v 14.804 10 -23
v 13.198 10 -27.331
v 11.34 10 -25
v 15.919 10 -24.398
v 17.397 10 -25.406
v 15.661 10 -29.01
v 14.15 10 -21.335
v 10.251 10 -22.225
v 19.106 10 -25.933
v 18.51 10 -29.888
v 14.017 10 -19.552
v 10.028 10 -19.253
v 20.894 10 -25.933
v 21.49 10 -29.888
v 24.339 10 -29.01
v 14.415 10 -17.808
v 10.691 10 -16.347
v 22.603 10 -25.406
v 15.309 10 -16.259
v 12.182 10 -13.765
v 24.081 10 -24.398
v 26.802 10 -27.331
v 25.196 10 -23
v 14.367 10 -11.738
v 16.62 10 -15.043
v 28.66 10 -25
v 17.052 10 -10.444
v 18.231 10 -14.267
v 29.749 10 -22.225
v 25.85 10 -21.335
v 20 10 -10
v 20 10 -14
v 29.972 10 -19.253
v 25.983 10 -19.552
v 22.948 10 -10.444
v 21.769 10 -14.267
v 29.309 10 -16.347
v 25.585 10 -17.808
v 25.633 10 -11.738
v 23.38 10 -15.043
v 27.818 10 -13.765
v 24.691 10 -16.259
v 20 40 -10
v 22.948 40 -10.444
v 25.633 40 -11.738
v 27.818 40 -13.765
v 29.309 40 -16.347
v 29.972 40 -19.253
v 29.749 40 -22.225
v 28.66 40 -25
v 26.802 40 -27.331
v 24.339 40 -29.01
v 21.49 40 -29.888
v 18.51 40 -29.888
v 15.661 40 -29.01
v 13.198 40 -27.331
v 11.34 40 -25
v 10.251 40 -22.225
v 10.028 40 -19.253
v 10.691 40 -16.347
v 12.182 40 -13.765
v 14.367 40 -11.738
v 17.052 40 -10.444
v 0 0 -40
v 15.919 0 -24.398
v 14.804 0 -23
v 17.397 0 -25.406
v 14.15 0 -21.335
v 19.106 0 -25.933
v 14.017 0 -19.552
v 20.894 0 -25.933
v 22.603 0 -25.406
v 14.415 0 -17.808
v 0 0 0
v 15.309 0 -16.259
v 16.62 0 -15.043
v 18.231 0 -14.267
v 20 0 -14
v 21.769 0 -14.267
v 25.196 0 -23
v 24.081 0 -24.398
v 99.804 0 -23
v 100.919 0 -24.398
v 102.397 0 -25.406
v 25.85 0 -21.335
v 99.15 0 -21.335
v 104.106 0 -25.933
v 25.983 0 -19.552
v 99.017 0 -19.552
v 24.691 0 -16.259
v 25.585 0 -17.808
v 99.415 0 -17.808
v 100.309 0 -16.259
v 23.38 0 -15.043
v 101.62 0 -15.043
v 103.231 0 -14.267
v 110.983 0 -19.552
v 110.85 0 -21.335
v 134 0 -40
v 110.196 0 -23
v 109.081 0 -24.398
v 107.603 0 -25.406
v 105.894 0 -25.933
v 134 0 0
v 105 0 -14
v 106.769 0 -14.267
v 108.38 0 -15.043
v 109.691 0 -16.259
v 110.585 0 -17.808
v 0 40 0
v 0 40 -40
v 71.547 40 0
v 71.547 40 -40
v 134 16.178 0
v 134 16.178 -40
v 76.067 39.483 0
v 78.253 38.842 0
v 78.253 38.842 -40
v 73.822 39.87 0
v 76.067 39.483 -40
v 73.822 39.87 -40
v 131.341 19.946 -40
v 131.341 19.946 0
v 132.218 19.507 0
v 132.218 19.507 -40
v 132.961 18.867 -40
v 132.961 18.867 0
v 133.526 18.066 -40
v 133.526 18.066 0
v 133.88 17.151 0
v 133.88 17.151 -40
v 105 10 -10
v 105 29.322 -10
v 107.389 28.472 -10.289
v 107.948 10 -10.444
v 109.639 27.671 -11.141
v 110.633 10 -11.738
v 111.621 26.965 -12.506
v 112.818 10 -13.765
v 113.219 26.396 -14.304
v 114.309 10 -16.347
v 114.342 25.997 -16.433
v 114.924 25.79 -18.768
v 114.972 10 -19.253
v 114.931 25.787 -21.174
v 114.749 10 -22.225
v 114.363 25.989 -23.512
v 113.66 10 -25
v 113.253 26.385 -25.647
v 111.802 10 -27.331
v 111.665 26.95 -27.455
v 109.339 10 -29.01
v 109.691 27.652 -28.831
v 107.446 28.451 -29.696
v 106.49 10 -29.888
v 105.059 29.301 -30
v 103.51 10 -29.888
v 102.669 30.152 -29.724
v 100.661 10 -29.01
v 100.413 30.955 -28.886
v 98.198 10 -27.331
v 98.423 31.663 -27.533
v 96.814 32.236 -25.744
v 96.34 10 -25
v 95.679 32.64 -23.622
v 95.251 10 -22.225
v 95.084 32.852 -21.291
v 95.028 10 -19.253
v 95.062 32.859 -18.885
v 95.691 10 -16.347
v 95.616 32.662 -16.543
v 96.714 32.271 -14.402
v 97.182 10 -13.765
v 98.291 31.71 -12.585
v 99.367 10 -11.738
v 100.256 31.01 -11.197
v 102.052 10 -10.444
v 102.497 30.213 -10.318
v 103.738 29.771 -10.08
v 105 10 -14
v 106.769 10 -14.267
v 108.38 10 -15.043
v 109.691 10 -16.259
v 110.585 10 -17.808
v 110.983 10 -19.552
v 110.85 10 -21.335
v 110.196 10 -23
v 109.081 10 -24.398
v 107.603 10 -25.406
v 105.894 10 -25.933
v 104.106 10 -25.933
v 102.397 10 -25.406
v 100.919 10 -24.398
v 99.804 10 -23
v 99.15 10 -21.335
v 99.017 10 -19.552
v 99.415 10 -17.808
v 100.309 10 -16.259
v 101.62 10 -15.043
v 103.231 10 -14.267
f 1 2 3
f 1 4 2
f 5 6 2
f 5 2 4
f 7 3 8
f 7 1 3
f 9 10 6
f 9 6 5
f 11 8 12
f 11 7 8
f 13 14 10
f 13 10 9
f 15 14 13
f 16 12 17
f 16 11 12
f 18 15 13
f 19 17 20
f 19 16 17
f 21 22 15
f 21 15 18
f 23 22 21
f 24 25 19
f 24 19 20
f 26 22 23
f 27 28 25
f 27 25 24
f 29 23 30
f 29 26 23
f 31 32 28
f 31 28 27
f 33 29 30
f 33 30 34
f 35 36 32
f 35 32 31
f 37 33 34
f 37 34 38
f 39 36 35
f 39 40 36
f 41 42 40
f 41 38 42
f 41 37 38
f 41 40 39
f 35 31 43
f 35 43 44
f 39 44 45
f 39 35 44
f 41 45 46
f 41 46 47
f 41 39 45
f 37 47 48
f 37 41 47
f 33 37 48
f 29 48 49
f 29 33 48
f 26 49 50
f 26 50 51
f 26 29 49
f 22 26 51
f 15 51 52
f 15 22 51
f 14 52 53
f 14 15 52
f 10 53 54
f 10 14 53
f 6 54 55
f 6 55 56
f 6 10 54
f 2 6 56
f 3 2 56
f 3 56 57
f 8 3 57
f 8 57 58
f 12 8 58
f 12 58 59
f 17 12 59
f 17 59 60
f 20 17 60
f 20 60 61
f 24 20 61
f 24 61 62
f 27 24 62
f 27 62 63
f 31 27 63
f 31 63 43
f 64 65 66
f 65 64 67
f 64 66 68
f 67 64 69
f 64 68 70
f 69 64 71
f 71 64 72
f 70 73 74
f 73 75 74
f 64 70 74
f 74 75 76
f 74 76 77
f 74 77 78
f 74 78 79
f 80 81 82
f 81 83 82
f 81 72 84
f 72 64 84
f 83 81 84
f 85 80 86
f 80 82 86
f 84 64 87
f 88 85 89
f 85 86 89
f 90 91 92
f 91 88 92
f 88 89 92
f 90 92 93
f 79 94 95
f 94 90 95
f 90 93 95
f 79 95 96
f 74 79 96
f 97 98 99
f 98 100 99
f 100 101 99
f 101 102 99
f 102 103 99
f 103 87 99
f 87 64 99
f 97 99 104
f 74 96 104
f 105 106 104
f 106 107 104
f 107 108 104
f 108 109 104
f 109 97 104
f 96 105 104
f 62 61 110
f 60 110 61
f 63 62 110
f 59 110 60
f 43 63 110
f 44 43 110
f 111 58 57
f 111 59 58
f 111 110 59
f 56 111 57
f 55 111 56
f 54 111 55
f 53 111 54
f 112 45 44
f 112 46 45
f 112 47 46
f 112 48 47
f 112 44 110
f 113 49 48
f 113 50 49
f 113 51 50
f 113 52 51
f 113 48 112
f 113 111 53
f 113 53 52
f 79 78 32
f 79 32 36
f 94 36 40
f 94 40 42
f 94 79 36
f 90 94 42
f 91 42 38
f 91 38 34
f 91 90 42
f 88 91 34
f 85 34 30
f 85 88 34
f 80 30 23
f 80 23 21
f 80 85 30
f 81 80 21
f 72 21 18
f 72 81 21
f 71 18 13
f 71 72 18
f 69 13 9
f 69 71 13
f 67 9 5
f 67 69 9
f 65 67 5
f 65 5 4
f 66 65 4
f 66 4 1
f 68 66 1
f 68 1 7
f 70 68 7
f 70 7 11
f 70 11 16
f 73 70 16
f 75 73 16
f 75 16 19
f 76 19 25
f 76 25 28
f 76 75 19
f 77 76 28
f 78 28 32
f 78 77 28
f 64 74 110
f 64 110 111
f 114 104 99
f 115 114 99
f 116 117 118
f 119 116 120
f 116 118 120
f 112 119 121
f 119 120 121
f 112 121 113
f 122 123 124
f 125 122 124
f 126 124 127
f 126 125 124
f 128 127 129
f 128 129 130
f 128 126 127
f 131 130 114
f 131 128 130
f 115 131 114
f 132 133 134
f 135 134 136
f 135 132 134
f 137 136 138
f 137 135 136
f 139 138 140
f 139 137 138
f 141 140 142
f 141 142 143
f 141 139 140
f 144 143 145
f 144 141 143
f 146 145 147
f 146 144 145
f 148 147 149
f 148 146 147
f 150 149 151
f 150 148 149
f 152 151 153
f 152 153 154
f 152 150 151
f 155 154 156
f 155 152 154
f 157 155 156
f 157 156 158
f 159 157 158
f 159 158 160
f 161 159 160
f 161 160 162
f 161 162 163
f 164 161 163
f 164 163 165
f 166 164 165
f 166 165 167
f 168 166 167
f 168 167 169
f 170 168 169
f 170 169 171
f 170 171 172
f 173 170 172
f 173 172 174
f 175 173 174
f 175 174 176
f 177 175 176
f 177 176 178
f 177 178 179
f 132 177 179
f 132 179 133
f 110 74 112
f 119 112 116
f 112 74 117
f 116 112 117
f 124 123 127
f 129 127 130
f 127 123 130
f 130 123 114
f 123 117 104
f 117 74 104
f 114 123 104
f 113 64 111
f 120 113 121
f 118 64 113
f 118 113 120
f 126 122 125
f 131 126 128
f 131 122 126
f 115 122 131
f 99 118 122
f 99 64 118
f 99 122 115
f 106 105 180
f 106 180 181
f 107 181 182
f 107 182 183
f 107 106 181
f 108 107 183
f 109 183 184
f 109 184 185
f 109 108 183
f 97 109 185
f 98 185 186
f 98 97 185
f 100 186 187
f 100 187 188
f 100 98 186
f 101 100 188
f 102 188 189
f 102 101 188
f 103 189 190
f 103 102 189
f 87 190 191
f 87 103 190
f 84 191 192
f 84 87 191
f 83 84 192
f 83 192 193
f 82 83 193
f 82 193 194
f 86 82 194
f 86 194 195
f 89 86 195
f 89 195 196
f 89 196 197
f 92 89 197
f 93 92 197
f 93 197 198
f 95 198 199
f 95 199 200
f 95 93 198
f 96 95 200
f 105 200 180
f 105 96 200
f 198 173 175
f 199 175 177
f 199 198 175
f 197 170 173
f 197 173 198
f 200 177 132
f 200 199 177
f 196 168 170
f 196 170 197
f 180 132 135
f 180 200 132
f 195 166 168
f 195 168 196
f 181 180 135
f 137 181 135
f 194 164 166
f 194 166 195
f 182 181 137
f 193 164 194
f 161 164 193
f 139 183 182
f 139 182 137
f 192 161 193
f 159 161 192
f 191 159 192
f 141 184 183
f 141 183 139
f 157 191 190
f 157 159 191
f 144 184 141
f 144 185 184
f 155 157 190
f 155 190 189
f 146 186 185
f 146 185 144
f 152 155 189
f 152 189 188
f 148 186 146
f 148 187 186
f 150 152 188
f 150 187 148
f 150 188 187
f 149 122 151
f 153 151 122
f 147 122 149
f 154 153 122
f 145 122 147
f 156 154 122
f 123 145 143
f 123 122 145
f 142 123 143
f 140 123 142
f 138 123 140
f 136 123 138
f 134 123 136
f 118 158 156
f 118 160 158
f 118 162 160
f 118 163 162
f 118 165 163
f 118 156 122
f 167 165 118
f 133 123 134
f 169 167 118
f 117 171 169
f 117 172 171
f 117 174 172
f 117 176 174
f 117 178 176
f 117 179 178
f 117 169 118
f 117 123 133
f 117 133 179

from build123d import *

# Parameters (mm, degrees)
SKETCH1_W               = 75
SKETCH1_H               = 40
SKETCH1_R               = 10
BOSS_EXTRUDE1_DEPTH     = 40
SKETCH1_4_W             = 59
SKETCH1_4_H             = 40
SKETCH1_4_R             = 10
BOSS_EXTRUDE2_DEPTH     = 40
CUT_EXTRUDE2_DEPTH      = 146.451022685
CUT_EXTRUDE2_DEPTH_BACK = 40
FILLET2_R               = 20
FILLET3_R               = 4
SKETCH1_5_R             = 10
SKETCH1_5_R_2           = 6
BOSS_EXTRUDE3_DEPTH     = 10


with BuildPart() as part:
    # Sketch1 → Boss-Extrude1 (new body)
    with BuildSketch(Plane(origin=(0, 0, 0), x_dir=(1, 0, 0), z_dir=(0, 1, 0))):
        with Locations((37.5, 20)):
            Rectangle(SKETCH1_W, SKETCH1_H)
        with Locations((20, 20)):
            Circle(SKETCH1_R, mode=Mode.SUBTRACT)
    extrude(amount=BOSS_EXTRUDE1_DEPTH)

    # Sketch1<4> → Boss-Extrude2 (add)
    with BuildSketch(Plane(origin=(0, 0, 0), x_dir=(1, 0, 0), z_dir=(0, 1, 0))):
        with Locations((104.5, 20)):
            Rectangle(SKETCH1_4_W, SKETCH1_4_H)
        with Locations((105, 20)):
            Circle(SKETCH1_4_R, mode=Mode.SUBTRACT)
    extrude(amount=BOSS_EXTRUDE2_DEPTH)

    # Sketch5 → Cut-Extrude2 (cut, two sides: drawn at the far end of the back side and taken through both)
    with BuildSketch(Plane(origin=(0, 0, -40), x_dir=(-1, 0, 0), z_dir=(0, 0, -1)).offset(-CUT_EXTRUDE2_DEPTH_BACK)):
        Polygon((-398.986226701, -75.317131538), (-134, 19), (-75, 40), (189.986226701, 134.317131538), (1.351963626, 664.289584939), (-587.620489776, 454.655321864), align=None)
    extrude(amount=CUT_EXTRUDE2_DEPTH + CUT_EXTRUDE2_DEPTH_BACK, mode=Mode.SUBTRACT)

    # Fillet2
    fillet2_edges = [part.edges().sort_by_distance(p)[0] for p in [
        (75, 40, -20),
    ]]
    fillet(fillet2_edges, radius=FILLET2_R)

    # Fillet3
    fillet3_edges = [part.edges().sort_by_distance(p)[0] for p in [
        (134, 19, -20),
    ]]
    fillet(fillet3_edges, radius=FILLET3_R)

    # Sketch1<5> → Boss-Extrude3 (add)
    # profile 1 of 2: a face of its own
    with BuildSketch(Plane(origin=(0, 0, 0), x_dir=(1, 0, 0), z_dir=(0, 1, 0))):
        with Locations((20, 20)):
            Circle(SKETCH1_5_R)
        with Locations((20, 20)):
            Circle(SKETCH1_5_R_2, mode=Mode.SUBTRACT)
    # profile 2 of 2: a face of its own
    with BuildSketch(Plane(origin=(0, 0, 0), x_dir=(1, 0, 0), z_dir=(0, 1, 0))):
        with Locations((105, 20)):
            Circle(SKETCH1_5_R)
        with Locations((105, 20)):
            Circle(SKETCH1_5_R_2, mode=Mode.SUBTRACT)
    extrude(amount=BOSS_EXTRUDE3_DEPTH)


solid = part.part
